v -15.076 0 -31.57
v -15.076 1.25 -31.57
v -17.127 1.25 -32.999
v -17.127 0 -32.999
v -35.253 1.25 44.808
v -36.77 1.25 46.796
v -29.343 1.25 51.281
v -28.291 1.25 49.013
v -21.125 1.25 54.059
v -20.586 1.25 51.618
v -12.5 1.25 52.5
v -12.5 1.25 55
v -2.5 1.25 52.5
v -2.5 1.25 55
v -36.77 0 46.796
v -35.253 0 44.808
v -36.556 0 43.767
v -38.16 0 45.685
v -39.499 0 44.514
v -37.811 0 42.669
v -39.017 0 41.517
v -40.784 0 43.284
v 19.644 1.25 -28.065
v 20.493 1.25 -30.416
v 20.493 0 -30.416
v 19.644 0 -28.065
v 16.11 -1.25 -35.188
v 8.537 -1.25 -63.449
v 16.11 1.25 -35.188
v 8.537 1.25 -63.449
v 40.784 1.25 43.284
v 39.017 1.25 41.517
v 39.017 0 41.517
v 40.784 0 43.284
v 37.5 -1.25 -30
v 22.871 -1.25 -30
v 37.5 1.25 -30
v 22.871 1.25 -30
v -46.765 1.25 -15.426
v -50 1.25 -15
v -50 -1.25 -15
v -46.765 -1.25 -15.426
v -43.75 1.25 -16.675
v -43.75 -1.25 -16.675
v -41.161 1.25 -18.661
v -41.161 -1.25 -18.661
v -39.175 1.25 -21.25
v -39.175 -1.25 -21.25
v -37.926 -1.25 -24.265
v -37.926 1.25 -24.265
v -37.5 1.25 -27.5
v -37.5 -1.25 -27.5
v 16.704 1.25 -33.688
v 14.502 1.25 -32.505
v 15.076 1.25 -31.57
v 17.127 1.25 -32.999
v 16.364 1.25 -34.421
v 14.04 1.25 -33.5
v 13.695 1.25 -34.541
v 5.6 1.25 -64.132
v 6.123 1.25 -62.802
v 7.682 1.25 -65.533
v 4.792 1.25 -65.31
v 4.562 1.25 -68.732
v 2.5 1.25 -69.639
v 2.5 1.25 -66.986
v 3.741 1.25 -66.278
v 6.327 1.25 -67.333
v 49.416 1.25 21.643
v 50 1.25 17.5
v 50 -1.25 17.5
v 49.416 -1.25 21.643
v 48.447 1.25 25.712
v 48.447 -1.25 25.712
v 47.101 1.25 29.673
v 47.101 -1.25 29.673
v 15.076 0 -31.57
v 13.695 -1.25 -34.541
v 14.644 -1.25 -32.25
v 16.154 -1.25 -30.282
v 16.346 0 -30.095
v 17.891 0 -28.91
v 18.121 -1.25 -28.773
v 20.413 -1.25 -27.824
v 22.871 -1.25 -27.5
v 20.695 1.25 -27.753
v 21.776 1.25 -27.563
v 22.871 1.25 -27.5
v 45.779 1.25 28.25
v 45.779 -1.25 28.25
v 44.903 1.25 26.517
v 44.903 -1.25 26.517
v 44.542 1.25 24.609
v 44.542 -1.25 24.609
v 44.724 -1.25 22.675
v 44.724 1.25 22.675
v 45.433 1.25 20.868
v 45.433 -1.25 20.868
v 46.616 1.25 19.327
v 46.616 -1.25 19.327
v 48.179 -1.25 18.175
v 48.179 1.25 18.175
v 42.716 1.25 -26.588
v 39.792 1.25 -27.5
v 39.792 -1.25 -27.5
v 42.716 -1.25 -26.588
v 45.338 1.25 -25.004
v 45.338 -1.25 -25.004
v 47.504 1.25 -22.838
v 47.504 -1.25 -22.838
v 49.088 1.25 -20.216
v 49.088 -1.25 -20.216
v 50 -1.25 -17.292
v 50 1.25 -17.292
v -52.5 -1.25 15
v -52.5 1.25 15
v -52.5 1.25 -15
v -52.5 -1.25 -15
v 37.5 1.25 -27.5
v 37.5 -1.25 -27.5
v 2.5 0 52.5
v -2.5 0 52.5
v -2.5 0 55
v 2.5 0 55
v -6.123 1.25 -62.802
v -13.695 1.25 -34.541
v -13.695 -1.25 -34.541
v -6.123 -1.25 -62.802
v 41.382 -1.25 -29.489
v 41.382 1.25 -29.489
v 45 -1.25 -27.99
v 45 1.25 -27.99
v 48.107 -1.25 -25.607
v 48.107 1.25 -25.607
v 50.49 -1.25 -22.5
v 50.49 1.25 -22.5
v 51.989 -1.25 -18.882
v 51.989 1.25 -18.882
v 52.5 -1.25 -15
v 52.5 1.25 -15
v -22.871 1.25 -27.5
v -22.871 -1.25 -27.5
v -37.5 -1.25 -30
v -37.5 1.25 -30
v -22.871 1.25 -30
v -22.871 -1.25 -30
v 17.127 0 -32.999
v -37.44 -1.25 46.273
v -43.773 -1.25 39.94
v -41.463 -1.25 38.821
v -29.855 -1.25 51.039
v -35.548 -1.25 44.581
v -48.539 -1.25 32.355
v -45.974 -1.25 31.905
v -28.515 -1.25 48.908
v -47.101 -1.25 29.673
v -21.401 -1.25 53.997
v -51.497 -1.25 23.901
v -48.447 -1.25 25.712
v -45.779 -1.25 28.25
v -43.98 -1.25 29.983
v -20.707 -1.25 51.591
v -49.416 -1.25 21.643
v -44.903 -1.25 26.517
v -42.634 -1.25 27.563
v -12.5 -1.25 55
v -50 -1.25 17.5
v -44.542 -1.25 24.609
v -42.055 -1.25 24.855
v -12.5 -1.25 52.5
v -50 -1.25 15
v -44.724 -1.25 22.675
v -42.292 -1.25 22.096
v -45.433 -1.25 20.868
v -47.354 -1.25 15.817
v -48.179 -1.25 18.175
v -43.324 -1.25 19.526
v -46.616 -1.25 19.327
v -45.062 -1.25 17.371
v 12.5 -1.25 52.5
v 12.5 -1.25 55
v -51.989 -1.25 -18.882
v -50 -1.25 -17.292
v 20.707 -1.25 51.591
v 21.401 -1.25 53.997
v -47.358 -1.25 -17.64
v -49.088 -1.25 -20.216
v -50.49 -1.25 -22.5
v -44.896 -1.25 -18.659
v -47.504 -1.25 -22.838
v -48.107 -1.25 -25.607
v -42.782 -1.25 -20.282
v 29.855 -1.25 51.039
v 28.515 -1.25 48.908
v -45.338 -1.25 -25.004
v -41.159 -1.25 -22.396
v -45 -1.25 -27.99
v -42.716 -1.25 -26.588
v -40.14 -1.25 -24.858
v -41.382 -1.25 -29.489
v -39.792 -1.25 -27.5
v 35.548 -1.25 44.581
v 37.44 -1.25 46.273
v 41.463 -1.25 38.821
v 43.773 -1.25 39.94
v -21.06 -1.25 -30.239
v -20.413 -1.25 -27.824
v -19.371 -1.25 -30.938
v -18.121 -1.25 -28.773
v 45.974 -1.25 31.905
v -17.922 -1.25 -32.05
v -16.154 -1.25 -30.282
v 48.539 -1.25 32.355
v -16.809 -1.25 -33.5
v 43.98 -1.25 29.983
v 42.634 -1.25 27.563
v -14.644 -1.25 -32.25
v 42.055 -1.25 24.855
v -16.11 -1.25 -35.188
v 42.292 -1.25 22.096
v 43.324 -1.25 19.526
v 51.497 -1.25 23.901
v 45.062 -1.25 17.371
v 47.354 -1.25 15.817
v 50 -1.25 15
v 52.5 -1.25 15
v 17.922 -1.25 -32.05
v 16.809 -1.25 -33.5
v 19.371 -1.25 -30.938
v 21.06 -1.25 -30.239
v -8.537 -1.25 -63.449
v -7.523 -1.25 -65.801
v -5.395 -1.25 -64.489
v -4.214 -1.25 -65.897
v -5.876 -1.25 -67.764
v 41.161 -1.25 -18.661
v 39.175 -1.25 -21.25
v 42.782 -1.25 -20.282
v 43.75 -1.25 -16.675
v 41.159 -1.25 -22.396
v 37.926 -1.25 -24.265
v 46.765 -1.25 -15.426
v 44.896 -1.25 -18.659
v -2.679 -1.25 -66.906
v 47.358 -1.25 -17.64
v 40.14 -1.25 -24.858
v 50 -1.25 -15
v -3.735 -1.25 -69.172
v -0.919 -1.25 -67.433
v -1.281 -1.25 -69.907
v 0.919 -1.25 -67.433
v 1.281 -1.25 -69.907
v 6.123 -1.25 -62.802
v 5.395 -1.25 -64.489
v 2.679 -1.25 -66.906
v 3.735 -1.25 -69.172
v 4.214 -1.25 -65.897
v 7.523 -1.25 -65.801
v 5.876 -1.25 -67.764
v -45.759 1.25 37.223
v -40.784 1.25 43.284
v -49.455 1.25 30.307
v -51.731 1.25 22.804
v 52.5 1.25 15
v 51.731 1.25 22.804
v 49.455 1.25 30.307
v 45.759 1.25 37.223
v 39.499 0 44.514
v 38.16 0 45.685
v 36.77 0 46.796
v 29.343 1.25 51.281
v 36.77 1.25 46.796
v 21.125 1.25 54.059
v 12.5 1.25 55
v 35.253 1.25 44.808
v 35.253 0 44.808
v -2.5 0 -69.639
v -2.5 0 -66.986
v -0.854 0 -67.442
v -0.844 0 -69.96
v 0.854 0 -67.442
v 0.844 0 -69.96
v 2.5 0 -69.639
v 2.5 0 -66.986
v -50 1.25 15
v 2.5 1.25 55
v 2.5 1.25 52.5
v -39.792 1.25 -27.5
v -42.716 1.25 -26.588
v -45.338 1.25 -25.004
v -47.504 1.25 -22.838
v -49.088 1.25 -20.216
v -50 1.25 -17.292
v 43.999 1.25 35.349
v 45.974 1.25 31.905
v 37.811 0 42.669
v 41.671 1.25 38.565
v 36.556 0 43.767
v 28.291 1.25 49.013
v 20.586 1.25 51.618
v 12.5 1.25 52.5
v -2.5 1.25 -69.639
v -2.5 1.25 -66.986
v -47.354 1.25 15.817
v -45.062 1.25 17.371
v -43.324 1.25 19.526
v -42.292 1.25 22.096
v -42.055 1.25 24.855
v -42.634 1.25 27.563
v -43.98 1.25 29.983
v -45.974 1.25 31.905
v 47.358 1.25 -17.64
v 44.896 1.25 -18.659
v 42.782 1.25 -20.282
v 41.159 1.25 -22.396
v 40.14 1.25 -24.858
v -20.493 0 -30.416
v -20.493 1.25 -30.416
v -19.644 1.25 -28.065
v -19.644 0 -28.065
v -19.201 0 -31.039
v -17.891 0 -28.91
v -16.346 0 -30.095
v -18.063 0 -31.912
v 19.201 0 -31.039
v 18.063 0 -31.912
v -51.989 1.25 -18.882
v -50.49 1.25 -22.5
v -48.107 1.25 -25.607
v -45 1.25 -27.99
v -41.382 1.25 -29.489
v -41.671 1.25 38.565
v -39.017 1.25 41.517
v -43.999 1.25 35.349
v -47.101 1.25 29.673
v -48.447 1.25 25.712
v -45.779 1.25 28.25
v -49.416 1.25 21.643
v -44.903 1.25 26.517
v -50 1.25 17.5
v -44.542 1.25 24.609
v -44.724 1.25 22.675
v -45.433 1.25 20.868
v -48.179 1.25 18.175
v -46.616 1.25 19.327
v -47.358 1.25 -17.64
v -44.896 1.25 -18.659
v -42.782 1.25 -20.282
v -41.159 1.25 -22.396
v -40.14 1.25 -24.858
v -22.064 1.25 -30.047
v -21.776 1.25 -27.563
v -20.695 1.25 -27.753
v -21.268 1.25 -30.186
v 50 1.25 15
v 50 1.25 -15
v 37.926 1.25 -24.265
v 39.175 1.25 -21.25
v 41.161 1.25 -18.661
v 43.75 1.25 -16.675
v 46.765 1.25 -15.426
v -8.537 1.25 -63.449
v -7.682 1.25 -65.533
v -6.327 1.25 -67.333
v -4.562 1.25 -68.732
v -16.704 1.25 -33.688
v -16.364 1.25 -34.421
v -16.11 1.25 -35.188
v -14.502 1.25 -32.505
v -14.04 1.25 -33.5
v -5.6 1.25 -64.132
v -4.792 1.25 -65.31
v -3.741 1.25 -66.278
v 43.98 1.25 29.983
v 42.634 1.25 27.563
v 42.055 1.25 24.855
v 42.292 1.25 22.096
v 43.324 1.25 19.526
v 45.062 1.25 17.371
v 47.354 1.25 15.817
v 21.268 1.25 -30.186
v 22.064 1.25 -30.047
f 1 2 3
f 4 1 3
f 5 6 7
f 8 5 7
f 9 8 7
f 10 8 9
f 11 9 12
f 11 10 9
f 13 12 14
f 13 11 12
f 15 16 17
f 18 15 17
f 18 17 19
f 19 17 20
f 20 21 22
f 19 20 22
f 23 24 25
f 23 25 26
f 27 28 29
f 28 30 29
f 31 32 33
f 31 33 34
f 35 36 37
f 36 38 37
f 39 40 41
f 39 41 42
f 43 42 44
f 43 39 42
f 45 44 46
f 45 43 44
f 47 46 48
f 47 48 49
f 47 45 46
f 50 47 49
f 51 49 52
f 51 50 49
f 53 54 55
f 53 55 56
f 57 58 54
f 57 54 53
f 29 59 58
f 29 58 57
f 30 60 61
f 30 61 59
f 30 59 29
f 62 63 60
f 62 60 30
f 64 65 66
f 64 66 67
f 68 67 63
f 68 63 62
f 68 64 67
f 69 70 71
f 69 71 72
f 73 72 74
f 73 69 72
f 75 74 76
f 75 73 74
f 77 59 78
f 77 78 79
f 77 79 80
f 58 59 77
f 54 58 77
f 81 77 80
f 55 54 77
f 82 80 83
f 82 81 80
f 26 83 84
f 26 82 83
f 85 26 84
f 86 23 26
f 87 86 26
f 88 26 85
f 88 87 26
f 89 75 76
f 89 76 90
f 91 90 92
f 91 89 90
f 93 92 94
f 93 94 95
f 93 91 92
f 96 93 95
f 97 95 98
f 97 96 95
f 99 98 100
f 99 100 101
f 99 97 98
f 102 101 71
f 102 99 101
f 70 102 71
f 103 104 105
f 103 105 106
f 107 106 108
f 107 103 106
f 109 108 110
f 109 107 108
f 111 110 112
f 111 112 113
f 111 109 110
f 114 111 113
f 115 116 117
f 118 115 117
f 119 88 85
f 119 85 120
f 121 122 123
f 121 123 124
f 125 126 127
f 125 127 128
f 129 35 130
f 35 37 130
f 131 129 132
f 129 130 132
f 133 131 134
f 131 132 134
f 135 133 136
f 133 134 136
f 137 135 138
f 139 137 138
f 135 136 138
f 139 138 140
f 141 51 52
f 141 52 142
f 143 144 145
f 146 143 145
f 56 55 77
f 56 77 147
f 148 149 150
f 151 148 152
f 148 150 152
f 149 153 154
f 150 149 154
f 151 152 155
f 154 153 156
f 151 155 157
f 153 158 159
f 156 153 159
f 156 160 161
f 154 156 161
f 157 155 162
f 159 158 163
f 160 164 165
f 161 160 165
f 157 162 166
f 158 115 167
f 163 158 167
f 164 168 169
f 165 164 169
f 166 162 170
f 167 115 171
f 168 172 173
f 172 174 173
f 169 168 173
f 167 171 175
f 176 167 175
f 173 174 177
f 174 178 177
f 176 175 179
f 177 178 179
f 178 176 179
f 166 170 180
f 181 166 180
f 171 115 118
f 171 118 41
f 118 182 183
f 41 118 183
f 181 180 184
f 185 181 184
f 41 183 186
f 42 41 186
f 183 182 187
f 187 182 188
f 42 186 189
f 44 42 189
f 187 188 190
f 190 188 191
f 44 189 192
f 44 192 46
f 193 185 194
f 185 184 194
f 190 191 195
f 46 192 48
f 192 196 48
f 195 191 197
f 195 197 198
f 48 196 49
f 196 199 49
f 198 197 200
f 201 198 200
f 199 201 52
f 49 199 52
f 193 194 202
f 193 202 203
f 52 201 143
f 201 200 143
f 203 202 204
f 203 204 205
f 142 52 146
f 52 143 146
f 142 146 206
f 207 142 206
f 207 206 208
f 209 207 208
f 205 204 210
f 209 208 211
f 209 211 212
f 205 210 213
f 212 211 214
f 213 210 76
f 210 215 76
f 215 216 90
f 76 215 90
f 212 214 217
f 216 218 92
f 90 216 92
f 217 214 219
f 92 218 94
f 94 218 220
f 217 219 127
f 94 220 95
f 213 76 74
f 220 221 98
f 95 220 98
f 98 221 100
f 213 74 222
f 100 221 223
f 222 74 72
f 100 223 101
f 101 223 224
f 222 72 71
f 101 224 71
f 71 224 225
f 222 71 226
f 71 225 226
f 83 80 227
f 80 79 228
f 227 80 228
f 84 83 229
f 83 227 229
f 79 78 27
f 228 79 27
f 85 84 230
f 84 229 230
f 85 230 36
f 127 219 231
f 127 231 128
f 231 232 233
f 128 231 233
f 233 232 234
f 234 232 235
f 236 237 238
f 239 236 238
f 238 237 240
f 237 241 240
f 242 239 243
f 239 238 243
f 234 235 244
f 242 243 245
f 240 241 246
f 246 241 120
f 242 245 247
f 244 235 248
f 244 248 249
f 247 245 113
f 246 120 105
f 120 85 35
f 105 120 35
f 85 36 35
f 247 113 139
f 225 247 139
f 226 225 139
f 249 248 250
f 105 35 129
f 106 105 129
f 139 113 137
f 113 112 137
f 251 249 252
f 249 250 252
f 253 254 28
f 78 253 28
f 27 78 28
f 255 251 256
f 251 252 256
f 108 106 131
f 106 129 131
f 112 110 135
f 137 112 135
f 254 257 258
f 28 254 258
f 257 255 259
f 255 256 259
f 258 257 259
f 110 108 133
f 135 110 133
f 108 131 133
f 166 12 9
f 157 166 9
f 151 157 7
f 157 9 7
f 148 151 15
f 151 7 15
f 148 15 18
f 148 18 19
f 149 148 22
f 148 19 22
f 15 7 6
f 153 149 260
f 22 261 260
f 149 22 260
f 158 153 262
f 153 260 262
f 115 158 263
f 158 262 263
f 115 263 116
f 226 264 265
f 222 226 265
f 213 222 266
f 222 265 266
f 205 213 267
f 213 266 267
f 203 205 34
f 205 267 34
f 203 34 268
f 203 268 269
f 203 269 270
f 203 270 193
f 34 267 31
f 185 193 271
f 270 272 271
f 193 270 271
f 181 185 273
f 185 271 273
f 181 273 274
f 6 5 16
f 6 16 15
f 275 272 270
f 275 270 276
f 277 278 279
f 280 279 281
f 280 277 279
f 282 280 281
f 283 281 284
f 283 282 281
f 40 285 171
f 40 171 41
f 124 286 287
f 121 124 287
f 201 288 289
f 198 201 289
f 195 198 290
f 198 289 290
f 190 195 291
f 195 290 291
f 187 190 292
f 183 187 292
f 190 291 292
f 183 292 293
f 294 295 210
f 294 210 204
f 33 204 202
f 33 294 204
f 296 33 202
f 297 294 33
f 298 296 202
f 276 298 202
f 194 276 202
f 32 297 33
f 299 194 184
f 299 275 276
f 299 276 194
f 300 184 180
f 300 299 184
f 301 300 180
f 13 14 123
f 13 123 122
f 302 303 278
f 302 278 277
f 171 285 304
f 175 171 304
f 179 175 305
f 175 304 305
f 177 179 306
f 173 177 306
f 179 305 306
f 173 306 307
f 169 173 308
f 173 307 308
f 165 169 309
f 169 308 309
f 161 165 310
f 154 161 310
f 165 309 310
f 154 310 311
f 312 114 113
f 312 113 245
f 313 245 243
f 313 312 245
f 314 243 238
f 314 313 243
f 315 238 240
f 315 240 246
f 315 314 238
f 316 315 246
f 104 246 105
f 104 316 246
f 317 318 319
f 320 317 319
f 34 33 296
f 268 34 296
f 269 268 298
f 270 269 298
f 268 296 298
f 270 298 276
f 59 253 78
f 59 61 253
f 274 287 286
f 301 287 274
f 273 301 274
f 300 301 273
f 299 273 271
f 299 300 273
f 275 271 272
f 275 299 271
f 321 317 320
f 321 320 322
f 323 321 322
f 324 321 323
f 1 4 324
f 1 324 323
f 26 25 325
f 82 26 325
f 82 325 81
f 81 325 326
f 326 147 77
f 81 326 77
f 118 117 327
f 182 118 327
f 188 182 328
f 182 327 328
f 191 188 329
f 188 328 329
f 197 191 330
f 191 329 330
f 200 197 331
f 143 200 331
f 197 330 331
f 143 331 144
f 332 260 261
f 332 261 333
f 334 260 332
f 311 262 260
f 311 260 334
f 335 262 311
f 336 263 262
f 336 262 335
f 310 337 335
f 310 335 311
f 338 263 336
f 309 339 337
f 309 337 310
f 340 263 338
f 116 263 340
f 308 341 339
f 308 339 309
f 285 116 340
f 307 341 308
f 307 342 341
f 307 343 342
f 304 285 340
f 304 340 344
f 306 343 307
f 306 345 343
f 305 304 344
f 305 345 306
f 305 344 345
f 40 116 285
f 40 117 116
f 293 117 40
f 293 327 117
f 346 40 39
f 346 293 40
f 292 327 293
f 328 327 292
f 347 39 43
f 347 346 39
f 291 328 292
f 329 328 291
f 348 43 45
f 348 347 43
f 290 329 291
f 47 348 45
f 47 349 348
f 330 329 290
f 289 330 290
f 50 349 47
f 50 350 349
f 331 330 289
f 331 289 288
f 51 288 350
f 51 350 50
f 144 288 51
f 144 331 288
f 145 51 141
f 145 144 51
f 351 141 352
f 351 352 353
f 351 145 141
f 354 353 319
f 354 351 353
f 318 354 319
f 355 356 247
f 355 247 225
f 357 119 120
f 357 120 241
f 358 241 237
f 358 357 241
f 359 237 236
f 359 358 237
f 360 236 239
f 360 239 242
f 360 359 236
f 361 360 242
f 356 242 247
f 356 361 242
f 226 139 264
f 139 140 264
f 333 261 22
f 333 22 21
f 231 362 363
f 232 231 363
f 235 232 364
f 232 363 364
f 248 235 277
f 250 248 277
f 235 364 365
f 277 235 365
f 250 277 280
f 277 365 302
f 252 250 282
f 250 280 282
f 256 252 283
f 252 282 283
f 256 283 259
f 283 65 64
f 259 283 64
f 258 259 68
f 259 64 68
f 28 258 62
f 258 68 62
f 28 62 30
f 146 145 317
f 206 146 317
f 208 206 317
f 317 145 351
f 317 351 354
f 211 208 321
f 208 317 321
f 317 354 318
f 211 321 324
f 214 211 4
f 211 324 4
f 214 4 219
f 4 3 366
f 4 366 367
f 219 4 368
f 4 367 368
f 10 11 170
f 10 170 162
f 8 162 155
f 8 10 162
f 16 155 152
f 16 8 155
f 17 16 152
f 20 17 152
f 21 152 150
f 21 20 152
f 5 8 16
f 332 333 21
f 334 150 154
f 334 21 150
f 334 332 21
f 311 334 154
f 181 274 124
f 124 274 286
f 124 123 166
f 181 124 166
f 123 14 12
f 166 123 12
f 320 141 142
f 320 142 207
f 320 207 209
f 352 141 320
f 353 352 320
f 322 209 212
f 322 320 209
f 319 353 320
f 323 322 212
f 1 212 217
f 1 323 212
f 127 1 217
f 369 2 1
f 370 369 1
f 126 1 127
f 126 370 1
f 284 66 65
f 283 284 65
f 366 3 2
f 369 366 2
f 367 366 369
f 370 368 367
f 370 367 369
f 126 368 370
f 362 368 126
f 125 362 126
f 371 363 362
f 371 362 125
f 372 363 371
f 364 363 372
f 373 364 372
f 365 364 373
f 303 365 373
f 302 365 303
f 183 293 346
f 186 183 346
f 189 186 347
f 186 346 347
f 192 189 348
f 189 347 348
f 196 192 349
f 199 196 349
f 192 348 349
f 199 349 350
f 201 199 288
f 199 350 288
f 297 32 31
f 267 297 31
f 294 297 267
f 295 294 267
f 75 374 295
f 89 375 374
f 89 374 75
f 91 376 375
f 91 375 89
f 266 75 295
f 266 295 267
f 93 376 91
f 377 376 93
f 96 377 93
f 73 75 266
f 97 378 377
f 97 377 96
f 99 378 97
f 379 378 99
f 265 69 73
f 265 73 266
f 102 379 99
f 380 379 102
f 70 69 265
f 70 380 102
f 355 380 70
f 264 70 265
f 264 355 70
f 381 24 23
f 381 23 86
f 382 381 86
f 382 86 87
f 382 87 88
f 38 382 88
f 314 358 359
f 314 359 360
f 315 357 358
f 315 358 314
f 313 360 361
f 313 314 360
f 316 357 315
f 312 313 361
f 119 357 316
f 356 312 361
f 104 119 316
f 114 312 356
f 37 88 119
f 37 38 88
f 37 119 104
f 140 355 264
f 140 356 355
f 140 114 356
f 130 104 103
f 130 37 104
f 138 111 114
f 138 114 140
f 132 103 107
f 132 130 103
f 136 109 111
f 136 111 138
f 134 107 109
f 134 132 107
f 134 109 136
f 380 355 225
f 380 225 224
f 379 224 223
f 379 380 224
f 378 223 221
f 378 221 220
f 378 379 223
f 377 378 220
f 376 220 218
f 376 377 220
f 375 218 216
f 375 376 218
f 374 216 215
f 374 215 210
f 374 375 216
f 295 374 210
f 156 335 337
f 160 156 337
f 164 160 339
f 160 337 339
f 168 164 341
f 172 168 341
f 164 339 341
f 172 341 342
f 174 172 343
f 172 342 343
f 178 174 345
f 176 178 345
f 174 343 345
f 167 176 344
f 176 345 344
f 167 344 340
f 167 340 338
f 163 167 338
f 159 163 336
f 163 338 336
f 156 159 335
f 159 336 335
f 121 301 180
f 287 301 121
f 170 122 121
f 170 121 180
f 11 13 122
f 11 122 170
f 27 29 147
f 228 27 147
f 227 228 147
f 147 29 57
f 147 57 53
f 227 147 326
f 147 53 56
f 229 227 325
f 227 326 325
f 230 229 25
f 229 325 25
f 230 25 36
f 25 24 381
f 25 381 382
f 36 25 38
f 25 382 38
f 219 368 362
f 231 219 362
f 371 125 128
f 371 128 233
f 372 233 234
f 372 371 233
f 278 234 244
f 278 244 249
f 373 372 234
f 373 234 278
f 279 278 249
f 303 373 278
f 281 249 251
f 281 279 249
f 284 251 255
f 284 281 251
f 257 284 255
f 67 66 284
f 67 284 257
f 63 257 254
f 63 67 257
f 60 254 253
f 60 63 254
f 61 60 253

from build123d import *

# Parameters (mm, degrees)
BOSS_EXTRUDE1_DEPTH = 1.25
BOSS_EXTRUDE5_DEPTH = 2.5
SKETCH6_W           = 5
SKETCH6_H           = 4
CUT_EXTRUDE1_DEPTH  = 1.25
CUT_EXTRUDE2_DEPTH  = 2.5


with BuildPart() as part:
    # Sketch2 → Boss-Extrude1 (new body, symmetric)
    with BuildSketch(Plane(origin=(0, 0, 0), x_dir=(1, 0, 0), z_dir=(0, 1, 0))):
        with BuildLine():
            Line((-16.109808132, 35.188266684), (-8.537351427, 63.449059844))
            ThreePointArc((-8.537351427, 63.449059844), (0, 70), (8.537351427, 63.449059844))
            Line((8.537351427, 63.449059844), (16.109808132, 35.188266684))
            ThreePointArc((16.109808132, 35.188266684), (18.609958913, 31.446526618), (22.871288916, 30))
            Line((22.871288916, 30), (37.5, 30))
            ThreePointArc((37.5, 30), (48.106601718, 25.606601718), (52.5, 15))
            Line((52.5, 15), (52.5, -15))
            ThreePointArc((52.5, -15), (40.784271247, -43.284271247), (12.5, -55))
            Line((12.5, -55), (-12.5, -55))
            ThreePointArc((-12.5, -55), (-40.784271247, -43.284271247), (-52.5, -15))
            Line((-52.5, -15), (-52.5, 15))
            ThreePointArc((-52.5, 15), (-48.106601718, 25.606601718), (-37.5, 30))
            Line((-37.5, 30), (-22.871288916, 30))
            ThreePointArc((-22.871288916, 30), (-18.609958913, 31.446526618), (-16.109808132, 35.188266684))
        make_face()
        with BuildLine():
            Line((6.122536861, 62.802012231), (13.694993566, 34.541219072))
            ThreePointArc((13.694993566, 34.541219072), (17.08805534, 29.463143267), (22.871288916, 27.5))
            Line((22.871288916, 27.5), (37.5, 27.5))
            ThreePointArc((37.5, 27.5), (46.338834765, 23.838834765), (50, 15))
            Line((50, 15), (50, -15))
            ThreePointArc((50, -15), (39.016504294, -41.516504294), (12.5, -52.5))
            Line((12.5, -52.5), (-12.5, -52.5))
            ThreePointArc((-12.5, -52.5), (-39.016504294, -41.516504294), (-50, -15))
            Line((-50, -15), (-50, 15))
            ThreePointArc((-50, 15), (-46.338834765, 23.838834765), (-37.5, 27.5))
            Line((-37.5, 27.5), (-22.871288916, 27.5))
            ThreePointArc((-22.871288916, 27.5), (-17.08805534, 29.463143267), (-13.694993566, 34.541219072))
            Line((-13.694993566, 34.541219072), (-6.122536861, 62.802012231))
            ThreePointArc((-6.122536861, 62.802012231), (0, 67.5), (6.122536861, 62.802012231))
        make_face(mode=Mode.SUBTRACT)
    extrude(amount=BOSS_EXTRUDE1_DEPTH, both=True)

    # Sketch5 → Boss-Extrude5 (add)
    with BuildSketch(Plane(origin=(0, 1.25, 0), x_dir=(1, 0, 0), z_dir=(0, 1, 0))):
        with BuildLine():
            ThreePointArc((-50, 15), (-41.161165235, 18.661165235), (-37.5, 27.5))
            ThreePointArc((-37.5, 27.5), (-46.338834765, 23.838834765), (-50, 15))
        make_face()
        with BuildLine():
            ThreePointArc((37.5, 27.5), (41.161165235, 18.661165235), (50, 15))
            ThreePointArc((50, 15), (46.338834765, 23.838834765), (37.5, 27.5))
        make_face()
        with BuildLine():
            ThreePointArc((-50, -15), (-42.291585286, -22.095919329), (-45.973512014, -31.904851181))
            ThreePointArc((-45.973512014, -31.904851181), (-48.979492188, -23.688880811), (-50, -15))
        make_face()
        with BuildLine():
            ThreePointArc((50, -15), (42.291585286, -22.095919329), (45.973512014, -31.904851181))
            ThreePointArc((45.973512014, -31.904851181), (48.979492187, -23.688880811), (50, -15))
        make_face()
    extrude(amount=-BOSS_EXTRUDE5_DEPTH)

    # Sketch6 → Cut-Extrude1 (cut)
    with BuildSketch(Plane(origin=(0, 1.25, 0), x_dir=(1, 0, 0), z_dir=(0, 1, 0))):
        with Locations((0, 68.75)):
            Rectangle(SKETCH6_W, SKETCH6_H)
        with BuildLine():
            Line((-20.493193447, 30.416333701), (-19.643873637, 28.065024308))
            ThreePointArc((-19.643873637, 28.065024308), (-17.08805534, 29.463143267), (-15.076081678, 31.570014354))
            Line((-15.076081678, 31.570014354), (-17.127452004, 32.998957945))
            ThreePointArc((-17.127452004, 32.998957945), (-18.609958913, 31.446526618), (-20.493193447, 30.416333701))
        make_face()
        with BuildLine():
            Line((20.493193447, 30.416333701), (19.643873637, 28.065024308))
            ThreePointArc((19.643873637, 28.065024308), (17.08805534, 29.463143267), (15.076081678, 31.570014354))
            Line((15.076081678, 31.570014354), (17.127452004, 32.998957945))
            ThreePointArc((17.127452004, 32.998957945), (18.609958913, 31.446526618), (20.493193447, 30.416333701))
        make_face()
        with BuildLine():
            Line((-40.784271247, -43.284271247), (-39.016504294, -41.516504294))
            ThreePointArc((-39.016504294, -41.516504294), (-37.189746158, -43.225280064), (-35.253133619, -44.808470449))
            Line((-35.253133619, -44.808470449), (-36.770009194, -46.795701812))
            ThreePointArc((-36.770009194, -46.795701812), (-38.835729235, -45.106965401), (-40.784271247, -43.284271247))
        make_face()
        with BuildLine():
            Line((36.770009194, -46.795701812), (35.253133619, -44.808470449))
            ThreePointArc((35.253133619, -44.808470449), (37.189746158, -43.225280064), (39.016504294, -41.516504294))
            Line((39.016504294, -41.516504294), (40.784271247, -43.284271247))
            ThreePointArc((40.784271247, -43.284271247), (38.835729235, -45.106965401), (36.770009194, -46.795701812))
        make_face()
        with Locations((0, -54)):
            Rectangle(SKETCH6_W, SKETCH6_H)
    extrude(amount=-CUT_EXTRUDE1_DEPTH, mode=Mode.SUBTRACT)

    # Sketch7 → Cut-Extrude2 (cut)
    with BuildSketch(Plane(origin=(0, 1.25, 0), x_dir=(1, 0, 0), z_dir=(0, 1, 0))):
        with BuildLine():
            ThreePointArc((-50, 17.291666667), (-42.781618275, 20.281618275), (-39.791666667, 27.5))
            ThreePointArc((-39.791666667, 27.5), (-46.486148678, 23.986148678), (-50, 17.291666667))
        make_face()
        with BuildLine():
            ThreePointArc((39.791666667, 27.5), (46.486148678, 23.986148678), (50, 17.291666667))
            ThreePointArc((50, 17.291666667), (42.781618275, 20.281618275), (39.791666667, 27.5))
        make_face()
        with BuildLine():
            ThreePointArc((-47.100502093, -29.673283714), (-44.723551432, -22.675178049), (-50, -17.5))
            ThreePointArc((-50, -17.5), (-48.979492187, -23.688880811), (-47.100502093, -29.673283714))
        make_face()
        with BuildLine():
            ThreePointArc((50, -17.5), (48.979492187, -23.688880811), (47.100502093, -29.673283714))
            ThreePointArc((47.100502093, -29.673283714), (44.723551432, -22.675178049), (50, -17.5))
        make_face()
    extrude(amount=-CUT_EXTRUDE2_DEPTH, mode=Mode.SUBTRACT)


solid = part.part
